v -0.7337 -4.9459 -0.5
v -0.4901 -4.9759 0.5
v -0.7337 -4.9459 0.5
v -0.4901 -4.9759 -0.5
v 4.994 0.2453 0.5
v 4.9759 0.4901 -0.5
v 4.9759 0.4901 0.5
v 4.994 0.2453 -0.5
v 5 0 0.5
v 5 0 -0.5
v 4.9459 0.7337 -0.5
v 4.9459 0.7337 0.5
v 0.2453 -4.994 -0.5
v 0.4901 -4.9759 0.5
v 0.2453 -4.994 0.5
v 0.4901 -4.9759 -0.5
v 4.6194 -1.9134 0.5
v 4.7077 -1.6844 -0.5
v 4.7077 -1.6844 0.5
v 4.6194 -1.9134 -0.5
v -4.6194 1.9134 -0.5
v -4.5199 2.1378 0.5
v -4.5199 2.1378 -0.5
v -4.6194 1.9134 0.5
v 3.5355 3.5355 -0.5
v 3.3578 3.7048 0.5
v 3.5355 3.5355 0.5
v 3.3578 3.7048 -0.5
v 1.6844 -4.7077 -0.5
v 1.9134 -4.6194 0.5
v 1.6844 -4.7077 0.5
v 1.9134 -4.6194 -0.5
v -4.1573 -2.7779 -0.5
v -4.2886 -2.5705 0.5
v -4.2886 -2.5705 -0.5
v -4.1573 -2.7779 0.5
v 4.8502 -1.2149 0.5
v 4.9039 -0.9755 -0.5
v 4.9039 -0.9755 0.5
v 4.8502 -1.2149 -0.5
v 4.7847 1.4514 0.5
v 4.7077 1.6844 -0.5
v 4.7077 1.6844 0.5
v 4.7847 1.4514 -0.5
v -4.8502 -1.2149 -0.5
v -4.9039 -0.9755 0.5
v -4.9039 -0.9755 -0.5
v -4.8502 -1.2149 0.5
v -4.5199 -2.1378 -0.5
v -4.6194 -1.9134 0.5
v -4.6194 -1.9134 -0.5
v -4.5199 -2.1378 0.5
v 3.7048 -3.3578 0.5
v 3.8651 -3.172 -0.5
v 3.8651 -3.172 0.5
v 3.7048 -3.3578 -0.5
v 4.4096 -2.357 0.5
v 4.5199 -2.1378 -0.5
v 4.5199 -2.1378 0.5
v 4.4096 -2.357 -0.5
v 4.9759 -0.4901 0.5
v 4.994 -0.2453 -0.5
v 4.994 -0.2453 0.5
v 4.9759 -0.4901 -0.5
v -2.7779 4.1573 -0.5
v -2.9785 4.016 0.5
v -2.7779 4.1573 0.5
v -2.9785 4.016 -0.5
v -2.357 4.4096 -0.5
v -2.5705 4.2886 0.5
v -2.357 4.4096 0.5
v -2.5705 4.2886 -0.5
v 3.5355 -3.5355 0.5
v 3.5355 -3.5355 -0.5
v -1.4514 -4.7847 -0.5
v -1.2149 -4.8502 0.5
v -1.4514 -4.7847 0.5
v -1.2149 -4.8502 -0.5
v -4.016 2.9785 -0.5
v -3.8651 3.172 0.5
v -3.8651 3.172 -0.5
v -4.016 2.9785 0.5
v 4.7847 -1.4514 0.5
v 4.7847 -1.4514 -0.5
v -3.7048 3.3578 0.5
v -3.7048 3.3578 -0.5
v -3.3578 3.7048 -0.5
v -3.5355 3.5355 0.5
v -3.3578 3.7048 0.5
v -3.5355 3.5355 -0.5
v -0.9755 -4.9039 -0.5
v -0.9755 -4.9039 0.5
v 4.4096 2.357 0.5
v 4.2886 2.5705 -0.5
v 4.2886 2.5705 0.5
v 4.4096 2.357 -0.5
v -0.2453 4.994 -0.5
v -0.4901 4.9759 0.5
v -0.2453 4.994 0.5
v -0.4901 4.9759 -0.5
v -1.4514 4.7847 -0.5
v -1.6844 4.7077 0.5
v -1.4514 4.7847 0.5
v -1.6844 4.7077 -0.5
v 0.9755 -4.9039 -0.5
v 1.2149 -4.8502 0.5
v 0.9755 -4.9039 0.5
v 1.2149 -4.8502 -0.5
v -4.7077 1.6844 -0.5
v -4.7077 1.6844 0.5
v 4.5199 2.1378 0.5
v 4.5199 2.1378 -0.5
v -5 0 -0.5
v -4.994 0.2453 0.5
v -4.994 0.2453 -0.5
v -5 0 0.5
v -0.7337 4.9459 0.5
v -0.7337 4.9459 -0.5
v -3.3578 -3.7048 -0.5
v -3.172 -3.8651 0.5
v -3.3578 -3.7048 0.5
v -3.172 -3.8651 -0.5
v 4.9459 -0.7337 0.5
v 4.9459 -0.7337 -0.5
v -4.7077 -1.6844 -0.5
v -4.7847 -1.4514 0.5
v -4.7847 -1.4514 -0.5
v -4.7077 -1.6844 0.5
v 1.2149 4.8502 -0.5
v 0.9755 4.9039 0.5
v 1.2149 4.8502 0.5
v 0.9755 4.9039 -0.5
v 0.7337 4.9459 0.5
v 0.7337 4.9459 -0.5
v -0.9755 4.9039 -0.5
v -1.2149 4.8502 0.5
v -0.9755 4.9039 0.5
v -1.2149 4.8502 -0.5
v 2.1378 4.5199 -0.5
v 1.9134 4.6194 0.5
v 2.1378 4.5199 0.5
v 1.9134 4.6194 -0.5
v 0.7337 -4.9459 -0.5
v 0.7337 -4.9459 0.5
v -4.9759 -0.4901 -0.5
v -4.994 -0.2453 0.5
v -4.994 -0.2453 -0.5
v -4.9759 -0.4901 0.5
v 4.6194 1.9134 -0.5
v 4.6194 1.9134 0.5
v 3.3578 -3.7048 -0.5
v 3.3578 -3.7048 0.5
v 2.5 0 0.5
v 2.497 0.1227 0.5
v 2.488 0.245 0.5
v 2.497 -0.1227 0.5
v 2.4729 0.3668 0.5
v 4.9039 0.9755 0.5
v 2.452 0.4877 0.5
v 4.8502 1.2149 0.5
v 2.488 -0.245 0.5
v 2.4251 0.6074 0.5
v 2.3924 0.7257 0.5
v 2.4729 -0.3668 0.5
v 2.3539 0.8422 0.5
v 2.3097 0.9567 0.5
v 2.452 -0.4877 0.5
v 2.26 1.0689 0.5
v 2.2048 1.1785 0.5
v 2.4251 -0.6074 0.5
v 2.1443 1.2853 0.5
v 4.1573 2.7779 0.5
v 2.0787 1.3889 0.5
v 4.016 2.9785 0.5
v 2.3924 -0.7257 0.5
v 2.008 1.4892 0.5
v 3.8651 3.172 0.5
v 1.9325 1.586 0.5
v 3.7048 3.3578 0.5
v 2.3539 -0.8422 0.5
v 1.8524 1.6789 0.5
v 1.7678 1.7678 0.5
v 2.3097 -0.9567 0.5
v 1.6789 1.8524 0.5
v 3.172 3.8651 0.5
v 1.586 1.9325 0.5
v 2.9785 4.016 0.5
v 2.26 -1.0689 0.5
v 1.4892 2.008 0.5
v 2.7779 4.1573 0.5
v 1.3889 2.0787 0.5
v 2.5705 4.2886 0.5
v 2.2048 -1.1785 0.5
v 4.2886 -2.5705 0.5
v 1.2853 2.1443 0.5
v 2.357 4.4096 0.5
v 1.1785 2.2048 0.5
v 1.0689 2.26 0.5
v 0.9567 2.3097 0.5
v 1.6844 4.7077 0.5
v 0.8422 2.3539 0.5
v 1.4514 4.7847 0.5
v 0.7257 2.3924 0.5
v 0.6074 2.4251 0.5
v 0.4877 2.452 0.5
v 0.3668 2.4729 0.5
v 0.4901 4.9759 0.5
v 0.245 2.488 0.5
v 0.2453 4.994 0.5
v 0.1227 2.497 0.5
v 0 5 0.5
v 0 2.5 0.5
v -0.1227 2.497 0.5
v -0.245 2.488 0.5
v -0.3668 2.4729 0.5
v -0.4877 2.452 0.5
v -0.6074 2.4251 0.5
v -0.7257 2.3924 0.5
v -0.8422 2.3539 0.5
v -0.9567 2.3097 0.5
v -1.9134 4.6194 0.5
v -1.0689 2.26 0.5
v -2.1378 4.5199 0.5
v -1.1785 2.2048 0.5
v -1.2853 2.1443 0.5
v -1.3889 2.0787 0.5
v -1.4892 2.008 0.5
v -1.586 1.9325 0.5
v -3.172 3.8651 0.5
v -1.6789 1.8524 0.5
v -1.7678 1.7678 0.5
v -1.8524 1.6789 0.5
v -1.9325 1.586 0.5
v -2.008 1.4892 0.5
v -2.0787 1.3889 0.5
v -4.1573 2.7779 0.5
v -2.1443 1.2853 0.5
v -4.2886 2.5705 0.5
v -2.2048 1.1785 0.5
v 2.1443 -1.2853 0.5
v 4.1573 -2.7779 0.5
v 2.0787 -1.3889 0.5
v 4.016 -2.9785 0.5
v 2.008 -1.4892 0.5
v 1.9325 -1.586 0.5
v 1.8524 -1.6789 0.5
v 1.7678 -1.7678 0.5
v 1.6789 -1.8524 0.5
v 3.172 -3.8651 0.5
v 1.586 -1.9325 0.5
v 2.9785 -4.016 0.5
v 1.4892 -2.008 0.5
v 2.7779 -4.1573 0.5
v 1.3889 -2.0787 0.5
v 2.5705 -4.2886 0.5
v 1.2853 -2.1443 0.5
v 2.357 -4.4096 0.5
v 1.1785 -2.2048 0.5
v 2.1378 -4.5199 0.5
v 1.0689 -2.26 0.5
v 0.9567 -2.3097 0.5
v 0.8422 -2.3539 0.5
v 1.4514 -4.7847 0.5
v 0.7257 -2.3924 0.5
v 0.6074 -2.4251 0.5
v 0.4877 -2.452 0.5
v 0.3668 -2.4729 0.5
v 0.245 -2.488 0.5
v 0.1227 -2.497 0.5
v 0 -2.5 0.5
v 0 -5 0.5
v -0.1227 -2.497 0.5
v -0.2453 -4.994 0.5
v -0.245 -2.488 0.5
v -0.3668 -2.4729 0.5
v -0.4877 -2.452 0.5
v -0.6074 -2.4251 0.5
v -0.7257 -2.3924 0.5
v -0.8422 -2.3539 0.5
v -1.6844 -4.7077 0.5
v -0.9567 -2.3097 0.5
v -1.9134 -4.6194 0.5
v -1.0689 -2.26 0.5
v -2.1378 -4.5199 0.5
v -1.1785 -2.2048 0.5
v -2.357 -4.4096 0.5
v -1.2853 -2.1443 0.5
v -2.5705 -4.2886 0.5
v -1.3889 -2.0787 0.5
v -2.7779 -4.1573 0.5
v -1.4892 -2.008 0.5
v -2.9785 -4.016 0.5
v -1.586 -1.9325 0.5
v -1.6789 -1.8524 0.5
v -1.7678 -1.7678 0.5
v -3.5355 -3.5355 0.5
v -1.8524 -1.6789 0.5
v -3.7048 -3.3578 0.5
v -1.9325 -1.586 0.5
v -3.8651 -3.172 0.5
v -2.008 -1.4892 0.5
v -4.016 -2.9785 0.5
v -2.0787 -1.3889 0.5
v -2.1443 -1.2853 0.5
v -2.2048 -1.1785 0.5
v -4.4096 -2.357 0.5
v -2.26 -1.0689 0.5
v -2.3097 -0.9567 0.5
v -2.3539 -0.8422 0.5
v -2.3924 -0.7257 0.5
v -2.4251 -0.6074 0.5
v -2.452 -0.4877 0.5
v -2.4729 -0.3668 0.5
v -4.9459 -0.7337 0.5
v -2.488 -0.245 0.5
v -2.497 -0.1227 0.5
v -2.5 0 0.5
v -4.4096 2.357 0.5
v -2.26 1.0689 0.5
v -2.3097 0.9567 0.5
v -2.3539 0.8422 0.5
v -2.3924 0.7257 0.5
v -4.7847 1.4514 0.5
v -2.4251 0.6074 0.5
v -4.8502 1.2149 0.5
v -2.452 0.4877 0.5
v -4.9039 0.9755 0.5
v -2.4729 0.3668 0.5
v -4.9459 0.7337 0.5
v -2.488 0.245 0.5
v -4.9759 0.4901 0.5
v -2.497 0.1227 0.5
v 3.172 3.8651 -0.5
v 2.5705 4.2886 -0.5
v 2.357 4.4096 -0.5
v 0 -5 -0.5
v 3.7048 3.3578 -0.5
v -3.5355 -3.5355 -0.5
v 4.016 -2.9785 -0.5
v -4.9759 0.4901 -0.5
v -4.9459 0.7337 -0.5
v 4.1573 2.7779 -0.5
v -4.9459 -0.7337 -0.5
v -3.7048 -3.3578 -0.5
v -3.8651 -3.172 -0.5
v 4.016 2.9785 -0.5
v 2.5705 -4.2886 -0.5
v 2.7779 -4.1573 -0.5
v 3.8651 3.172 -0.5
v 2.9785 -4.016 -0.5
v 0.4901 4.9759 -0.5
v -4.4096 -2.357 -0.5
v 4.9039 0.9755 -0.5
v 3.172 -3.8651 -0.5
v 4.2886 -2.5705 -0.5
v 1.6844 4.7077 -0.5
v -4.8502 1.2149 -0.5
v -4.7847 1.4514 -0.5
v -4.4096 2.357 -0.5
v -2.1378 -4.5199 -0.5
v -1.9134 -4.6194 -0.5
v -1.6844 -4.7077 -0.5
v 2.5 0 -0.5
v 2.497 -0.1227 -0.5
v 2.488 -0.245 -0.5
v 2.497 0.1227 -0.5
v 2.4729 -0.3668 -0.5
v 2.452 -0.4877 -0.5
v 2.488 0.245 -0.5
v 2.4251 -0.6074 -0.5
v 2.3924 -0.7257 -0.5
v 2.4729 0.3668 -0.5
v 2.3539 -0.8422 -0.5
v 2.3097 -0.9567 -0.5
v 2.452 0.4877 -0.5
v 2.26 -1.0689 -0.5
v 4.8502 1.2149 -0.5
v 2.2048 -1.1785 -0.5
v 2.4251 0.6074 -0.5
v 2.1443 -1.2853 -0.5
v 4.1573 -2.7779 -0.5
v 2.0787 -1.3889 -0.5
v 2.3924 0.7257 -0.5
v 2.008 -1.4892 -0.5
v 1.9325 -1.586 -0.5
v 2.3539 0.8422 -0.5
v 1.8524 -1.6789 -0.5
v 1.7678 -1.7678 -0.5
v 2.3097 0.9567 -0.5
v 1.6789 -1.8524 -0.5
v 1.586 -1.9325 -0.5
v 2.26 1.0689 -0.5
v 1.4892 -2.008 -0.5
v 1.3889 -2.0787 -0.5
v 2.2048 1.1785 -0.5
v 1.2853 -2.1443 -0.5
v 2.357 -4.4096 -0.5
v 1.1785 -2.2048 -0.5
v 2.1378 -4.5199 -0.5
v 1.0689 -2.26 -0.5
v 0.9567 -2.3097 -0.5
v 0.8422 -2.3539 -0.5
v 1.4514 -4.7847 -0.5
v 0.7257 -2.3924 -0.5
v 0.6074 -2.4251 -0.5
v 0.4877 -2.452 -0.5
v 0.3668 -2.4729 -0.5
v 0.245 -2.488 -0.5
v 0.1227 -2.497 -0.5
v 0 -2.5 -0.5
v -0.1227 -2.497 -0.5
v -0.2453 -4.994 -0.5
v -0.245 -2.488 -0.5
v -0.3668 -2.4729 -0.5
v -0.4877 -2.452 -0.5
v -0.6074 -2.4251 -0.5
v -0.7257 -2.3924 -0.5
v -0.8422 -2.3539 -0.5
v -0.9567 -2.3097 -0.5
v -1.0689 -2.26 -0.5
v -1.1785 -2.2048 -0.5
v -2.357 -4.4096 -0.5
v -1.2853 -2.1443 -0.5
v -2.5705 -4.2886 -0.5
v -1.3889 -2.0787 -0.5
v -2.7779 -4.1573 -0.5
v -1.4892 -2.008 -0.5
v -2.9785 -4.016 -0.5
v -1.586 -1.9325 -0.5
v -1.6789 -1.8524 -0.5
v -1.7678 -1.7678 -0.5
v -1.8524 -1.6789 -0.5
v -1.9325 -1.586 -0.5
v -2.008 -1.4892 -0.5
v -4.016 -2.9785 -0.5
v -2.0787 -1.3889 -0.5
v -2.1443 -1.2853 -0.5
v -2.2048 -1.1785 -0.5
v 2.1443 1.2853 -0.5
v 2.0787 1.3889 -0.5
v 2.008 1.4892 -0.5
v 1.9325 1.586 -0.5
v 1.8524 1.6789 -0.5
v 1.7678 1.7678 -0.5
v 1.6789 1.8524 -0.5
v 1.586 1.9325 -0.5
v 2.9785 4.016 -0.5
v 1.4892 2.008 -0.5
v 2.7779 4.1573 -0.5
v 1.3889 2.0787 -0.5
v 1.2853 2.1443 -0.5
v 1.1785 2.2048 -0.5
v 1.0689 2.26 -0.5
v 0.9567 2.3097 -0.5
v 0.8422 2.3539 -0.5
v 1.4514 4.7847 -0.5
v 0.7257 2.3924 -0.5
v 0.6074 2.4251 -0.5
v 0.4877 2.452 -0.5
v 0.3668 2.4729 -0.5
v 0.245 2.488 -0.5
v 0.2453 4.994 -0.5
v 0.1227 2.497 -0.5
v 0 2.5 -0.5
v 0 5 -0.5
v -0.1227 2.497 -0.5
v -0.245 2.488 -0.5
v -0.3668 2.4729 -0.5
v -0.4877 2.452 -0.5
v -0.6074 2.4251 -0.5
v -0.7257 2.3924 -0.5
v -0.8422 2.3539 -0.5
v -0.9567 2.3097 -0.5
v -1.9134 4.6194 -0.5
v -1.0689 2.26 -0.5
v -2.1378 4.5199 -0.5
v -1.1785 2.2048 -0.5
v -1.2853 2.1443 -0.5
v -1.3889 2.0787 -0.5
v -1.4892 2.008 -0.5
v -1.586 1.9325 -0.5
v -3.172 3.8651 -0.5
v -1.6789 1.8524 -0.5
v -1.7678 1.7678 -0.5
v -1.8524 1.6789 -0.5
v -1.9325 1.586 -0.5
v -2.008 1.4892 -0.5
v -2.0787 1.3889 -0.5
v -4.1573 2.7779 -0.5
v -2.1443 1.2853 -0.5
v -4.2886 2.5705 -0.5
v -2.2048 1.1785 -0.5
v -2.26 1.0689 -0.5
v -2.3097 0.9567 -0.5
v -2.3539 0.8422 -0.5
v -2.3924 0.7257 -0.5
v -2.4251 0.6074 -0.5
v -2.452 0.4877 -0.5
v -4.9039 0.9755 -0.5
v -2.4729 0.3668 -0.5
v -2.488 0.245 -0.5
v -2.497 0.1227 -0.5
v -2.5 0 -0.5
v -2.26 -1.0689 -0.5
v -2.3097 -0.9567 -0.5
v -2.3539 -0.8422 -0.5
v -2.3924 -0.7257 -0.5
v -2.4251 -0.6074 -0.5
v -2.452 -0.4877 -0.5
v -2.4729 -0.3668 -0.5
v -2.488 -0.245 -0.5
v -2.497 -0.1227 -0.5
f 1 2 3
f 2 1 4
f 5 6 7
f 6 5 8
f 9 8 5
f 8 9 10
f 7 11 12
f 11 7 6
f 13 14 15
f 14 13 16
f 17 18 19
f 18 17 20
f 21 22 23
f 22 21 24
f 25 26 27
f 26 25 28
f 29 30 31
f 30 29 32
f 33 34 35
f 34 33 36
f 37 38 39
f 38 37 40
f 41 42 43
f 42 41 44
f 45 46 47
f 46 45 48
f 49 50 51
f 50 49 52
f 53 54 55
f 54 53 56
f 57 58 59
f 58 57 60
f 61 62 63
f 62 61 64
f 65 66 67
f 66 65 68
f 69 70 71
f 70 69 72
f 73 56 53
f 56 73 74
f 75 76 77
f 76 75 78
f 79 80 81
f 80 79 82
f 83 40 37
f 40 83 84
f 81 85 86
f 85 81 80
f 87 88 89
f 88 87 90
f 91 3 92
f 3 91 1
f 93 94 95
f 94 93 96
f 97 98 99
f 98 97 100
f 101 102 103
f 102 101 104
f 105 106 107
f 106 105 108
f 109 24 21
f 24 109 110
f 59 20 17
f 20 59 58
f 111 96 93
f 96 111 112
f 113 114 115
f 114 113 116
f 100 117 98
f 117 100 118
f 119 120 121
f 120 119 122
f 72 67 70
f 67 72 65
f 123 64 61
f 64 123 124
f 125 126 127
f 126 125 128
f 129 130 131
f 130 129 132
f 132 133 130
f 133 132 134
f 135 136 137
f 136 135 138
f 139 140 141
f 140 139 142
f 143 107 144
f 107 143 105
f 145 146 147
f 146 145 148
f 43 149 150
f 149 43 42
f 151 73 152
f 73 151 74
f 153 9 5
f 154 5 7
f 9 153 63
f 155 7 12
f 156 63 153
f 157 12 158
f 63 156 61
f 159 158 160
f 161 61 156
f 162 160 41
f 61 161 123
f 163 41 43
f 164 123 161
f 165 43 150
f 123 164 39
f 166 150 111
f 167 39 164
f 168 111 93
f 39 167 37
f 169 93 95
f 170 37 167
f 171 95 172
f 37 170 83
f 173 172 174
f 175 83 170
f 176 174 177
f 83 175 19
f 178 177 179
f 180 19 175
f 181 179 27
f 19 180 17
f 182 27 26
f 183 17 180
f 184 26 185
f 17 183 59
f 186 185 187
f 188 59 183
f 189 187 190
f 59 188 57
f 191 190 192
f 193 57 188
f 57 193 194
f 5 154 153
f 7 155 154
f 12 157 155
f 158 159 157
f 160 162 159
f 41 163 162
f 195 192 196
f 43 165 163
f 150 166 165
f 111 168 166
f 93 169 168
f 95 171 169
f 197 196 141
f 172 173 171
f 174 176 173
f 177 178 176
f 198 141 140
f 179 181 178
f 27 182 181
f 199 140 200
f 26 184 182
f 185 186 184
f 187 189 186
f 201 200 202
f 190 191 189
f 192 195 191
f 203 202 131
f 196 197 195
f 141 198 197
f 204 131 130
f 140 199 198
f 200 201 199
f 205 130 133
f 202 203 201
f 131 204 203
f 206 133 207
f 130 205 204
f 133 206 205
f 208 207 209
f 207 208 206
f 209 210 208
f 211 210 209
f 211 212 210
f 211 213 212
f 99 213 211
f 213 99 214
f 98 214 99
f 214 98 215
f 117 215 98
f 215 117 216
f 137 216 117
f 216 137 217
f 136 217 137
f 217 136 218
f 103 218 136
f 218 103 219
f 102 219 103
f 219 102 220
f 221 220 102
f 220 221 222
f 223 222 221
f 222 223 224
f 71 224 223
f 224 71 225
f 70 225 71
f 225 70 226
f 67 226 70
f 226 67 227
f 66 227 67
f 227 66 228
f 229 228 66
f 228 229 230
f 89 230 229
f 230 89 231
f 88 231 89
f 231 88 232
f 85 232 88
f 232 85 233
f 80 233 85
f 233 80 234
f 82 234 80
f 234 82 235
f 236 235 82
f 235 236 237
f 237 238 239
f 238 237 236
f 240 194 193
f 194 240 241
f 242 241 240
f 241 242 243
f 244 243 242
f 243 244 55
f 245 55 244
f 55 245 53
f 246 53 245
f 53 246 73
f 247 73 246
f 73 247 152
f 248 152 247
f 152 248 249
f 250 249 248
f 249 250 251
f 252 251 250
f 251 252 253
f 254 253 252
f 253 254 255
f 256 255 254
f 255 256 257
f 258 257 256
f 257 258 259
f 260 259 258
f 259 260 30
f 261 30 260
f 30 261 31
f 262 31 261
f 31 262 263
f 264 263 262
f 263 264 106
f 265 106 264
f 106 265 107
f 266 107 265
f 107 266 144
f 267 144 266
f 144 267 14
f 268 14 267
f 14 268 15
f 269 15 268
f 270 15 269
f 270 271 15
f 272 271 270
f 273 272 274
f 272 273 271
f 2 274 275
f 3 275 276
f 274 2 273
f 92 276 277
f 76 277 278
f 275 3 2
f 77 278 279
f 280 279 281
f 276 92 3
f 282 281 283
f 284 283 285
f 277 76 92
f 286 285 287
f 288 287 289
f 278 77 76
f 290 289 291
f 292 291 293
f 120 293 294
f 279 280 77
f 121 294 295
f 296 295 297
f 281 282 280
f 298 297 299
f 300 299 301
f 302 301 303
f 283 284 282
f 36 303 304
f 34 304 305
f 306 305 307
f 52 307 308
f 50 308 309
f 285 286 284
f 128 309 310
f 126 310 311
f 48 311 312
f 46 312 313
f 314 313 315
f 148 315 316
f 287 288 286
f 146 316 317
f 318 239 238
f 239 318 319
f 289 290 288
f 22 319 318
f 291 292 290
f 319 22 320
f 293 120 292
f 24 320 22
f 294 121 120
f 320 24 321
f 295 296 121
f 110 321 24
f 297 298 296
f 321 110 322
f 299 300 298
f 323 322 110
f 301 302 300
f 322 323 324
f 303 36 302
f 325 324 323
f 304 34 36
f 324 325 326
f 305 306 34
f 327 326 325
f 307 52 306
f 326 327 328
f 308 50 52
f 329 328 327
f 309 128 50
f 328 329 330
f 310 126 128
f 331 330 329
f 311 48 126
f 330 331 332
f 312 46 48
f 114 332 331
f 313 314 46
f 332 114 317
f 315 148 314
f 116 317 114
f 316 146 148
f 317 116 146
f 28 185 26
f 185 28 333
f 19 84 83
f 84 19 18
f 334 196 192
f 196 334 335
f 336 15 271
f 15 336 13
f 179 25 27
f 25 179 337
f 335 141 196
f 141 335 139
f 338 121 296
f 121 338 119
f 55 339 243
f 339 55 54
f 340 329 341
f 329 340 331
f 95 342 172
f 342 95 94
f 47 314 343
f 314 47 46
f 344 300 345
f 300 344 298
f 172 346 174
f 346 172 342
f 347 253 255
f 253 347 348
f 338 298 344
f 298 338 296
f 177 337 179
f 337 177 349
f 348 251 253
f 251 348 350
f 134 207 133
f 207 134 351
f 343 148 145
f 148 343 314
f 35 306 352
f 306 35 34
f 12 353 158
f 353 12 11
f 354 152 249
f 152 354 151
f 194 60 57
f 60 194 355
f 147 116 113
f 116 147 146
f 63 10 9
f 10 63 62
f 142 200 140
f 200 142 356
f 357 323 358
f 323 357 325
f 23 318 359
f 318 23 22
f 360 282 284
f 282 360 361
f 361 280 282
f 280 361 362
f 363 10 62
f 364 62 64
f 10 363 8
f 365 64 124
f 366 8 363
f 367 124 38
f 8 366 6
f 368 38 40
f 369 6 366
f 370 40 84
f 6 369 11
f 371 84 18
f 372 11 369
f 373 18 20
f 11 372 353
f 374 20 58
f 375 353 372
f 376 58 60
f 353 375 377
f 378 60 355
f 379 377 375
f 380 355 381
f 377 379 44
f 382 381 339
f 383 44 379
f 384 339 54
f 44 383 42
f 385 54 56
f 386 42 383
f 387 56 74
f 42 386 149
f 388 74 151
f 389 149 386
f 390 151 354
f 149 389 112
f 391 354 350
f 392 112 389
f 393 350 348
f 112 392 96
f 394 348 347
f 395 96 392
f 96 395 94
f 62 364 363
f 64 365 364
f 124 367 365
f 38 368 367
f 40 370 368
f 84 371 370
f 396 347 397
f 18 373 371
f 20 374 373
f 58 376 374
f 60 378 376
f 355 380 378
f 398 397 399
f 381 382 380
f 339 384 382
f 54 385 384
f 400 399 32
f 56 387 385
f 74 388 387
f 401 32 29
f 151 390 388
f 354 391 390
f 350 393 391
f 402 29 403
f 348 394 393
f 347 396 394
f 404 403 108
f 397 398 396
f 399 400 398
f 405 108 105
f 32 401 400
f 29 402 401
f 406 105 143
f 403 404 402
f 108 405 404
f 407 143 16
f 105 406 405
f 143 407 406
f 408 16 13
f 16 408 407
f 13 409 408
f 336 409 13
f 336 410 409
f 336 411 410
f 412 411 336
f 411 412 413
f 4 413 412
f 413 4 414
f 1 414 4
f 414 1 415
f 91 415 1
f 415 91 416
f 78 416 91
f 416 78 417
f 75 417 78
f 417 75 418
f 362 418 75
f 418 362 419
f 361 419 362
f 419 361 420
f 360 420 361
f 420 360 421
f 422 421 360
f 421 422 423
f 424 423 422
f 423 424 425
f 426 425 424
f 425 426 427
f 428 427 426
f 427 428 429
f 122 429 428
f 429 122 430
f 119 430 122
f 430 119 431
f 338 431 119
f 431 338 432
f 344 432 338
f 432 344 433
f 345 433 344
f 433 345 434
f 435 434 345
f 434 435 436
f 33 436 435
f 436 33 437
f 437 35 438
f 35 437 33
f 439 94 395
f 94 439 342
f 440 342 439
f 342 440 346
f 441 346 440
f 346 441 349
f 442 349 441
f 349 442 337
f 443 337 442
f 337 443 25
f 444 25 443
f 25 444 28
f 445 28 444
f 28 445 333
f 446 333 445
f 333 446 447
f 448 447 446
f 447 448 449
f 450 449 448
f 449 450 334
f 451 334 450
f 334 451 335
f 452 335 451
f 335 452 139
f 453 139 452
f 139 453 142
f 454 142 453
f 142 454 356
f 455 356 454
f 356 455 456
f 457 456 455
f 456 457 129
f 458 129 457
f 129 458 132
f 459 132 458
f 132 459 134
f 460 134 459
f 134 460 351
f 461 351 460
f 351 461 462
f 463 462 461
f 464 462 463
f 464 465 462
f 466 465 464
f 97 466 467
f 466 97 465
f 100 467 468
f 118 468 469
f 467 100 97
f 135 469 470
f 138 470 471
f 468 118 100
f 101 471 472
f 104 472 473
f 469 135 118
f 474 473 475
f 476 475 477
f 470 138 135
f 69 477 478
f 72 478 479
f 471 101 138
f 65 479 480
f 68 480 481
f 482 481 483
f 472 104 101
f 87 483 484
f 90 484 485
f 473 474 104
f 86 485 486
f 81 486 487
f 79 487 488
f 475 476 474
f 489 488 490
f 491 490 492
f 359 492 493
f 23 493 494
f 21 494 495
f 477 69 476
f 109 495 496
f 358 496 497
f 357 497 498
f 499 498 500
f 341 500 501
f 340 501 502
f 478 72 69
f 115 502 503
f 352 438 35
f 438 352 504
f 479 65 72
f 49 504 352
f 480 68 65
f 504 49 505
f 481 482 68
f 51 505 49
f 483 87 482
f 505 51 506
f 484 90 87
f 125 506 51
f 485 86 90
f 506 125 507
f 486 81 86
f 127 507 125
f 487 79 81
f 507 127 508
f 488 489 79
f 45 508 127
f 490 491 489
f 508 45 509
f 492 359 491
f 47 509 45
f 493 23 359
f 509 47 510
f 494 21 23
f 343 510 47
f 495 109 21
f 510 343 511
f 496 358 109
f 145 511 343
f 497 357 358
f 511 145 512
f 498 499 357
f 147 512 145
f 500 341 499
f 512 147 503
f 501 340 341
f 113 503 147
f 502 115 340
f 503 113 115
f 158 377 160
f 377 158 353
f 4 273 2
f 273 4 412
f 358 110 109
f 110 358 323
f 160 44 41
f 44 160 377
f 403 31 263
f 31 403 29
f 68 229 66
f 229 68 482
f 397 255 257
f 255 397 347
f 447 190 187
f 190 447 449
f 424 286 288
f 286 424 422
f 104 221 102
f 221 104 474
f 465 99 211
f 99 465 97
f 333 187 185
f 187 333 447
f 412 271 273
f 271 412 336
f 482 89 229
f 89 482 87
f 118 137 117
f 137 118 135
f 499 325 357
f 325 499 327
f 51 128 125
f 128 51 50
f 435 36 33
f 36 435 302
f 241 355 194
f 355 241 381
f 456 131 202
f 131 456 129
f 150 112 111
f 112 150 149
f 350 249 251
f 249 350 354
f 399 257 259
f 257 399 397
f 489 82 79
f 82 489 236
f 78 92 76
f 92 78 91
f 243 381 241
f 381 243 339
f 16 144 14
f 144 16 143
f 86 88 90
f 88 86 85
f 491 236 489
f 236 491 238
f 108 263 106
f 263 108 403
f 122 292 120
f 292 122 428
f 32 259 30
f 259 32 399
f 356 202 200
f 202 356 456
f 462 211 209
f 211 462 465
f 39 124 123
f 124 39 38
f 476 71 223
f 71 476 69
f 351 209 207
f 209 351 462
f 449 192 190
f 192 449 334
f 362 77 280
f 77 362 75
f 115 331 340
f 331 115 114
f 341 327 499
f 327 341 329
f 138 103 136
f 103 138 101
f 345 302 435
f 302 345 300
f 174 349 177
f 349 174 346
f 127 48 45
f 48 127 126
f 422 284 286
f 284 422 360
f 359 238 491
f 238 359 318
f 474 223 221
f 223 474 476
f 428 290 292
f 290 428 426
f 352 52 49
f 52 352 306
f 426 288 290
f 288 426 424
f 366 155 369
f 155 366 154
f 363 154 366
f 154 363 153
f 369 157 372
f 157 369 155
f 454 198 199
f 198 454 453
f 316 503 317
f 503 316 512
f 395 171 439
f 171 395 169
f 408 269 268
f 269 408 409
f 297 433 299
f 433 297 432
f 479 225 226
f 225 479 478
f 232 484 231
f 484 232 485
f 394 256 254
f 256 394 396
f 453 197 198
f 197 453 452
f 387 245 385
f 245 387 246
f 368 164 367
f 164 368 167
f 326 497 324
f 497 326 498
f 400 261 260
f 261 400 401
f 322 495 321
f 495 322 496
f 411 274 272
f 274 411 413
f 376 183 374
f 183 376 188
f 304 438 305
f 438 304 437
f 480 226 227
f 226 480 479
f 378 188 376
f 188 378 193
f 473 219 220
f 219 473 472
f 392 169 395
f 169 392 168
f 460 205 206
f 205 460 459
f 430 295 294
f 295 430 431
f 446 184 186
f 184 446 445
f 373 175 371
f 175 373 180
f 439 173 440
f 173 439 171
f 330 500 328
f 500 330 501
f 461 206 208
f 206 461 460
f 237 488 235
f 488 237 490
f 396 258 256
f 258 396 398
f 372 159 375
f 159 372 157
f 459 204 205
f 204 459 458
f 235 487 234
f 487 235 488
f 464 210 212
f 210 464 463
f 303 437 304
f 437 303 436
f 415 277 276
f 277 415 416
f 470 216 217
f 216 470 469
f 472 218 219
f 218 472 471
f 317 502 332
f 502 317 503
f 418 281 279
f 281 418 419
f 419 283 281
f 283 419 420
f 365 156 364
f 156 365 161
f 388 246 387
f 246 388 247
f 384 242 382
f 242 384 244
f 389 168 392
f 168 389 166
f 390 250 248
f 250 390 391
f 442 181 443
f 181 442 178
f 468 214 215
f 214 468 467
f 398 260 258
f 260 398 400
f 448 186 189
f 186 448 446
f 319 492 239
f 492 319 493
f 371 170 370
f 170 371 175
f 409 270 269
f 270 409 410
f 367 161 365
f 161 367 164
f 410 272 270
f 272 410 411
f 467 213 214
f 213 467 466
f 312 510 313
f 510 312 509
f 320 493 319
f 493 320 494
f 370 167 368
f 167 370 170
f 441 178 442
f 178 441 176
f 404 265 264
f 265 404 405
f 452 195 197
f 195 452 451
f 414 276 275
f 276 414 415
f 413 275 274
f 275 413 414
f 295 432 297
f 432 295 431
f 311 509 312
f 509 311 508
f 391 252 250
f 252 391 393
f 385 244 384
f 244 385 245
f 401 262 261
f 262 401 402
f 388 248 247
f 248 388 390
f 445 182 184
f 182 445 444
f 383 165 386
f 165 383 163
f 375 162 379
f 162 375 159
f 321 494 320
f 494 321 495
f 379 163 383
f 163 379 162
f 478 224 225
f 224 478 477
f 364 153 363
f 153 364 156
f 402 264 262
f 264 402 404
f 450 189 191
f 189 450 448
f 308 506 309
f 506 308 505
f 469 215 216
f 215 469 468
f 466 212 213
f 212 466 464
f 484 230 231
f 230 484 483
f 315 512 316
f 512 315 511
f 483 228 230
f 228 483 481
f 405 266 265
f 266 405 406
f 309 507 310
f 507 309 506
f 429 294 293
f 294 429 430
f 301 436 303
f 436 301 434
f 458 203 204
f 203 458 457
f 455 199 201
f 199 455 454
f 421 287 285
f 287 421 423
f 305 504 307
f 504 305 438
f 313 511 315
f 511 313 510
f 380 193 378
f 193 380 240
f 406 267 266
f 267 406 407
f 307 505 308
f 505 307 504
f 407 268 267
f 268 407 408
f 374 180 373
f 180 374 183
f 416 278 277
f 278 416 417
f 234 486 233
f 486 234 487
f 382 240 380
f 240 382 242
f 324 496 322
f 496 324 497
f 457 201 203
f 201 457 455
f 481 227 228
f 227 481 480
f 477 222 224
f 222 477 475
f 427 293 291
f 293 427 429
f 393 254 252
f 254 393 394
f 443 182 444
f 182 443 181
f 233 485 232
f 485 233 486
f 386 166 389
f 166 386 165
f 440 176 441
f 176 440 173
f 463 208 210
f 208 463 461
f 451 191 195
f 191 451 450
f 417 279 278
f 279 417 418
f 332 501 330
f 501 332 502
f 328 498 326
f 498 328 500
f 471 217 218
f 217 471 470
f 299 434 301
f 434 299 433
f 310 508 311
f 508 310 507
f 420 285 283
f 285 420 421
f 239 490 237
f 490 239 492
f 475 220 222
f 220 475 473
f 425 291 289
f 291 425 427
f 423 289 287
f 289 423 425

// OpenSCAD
// Flat washer: 5.0mm inner hole, 10.0mm outer diameter, 1.0mm thickness

inner_diameter_mm = 5.0;   // ID
outer_diameter_mm = 10.0;  // OD
thickness_mm      = 1.0;   // thickness

$fn = 128;

module washer(id, od, t) {
    difference() {
        cylinder(d=od, h=t, center=true);
        cylinder(d=id, h=t + 0.2, center=true); // slight extra to ensure clean cut
    }
}

washer(inner_diameter_mm, outer_diameter_mm, thickness_mm);
